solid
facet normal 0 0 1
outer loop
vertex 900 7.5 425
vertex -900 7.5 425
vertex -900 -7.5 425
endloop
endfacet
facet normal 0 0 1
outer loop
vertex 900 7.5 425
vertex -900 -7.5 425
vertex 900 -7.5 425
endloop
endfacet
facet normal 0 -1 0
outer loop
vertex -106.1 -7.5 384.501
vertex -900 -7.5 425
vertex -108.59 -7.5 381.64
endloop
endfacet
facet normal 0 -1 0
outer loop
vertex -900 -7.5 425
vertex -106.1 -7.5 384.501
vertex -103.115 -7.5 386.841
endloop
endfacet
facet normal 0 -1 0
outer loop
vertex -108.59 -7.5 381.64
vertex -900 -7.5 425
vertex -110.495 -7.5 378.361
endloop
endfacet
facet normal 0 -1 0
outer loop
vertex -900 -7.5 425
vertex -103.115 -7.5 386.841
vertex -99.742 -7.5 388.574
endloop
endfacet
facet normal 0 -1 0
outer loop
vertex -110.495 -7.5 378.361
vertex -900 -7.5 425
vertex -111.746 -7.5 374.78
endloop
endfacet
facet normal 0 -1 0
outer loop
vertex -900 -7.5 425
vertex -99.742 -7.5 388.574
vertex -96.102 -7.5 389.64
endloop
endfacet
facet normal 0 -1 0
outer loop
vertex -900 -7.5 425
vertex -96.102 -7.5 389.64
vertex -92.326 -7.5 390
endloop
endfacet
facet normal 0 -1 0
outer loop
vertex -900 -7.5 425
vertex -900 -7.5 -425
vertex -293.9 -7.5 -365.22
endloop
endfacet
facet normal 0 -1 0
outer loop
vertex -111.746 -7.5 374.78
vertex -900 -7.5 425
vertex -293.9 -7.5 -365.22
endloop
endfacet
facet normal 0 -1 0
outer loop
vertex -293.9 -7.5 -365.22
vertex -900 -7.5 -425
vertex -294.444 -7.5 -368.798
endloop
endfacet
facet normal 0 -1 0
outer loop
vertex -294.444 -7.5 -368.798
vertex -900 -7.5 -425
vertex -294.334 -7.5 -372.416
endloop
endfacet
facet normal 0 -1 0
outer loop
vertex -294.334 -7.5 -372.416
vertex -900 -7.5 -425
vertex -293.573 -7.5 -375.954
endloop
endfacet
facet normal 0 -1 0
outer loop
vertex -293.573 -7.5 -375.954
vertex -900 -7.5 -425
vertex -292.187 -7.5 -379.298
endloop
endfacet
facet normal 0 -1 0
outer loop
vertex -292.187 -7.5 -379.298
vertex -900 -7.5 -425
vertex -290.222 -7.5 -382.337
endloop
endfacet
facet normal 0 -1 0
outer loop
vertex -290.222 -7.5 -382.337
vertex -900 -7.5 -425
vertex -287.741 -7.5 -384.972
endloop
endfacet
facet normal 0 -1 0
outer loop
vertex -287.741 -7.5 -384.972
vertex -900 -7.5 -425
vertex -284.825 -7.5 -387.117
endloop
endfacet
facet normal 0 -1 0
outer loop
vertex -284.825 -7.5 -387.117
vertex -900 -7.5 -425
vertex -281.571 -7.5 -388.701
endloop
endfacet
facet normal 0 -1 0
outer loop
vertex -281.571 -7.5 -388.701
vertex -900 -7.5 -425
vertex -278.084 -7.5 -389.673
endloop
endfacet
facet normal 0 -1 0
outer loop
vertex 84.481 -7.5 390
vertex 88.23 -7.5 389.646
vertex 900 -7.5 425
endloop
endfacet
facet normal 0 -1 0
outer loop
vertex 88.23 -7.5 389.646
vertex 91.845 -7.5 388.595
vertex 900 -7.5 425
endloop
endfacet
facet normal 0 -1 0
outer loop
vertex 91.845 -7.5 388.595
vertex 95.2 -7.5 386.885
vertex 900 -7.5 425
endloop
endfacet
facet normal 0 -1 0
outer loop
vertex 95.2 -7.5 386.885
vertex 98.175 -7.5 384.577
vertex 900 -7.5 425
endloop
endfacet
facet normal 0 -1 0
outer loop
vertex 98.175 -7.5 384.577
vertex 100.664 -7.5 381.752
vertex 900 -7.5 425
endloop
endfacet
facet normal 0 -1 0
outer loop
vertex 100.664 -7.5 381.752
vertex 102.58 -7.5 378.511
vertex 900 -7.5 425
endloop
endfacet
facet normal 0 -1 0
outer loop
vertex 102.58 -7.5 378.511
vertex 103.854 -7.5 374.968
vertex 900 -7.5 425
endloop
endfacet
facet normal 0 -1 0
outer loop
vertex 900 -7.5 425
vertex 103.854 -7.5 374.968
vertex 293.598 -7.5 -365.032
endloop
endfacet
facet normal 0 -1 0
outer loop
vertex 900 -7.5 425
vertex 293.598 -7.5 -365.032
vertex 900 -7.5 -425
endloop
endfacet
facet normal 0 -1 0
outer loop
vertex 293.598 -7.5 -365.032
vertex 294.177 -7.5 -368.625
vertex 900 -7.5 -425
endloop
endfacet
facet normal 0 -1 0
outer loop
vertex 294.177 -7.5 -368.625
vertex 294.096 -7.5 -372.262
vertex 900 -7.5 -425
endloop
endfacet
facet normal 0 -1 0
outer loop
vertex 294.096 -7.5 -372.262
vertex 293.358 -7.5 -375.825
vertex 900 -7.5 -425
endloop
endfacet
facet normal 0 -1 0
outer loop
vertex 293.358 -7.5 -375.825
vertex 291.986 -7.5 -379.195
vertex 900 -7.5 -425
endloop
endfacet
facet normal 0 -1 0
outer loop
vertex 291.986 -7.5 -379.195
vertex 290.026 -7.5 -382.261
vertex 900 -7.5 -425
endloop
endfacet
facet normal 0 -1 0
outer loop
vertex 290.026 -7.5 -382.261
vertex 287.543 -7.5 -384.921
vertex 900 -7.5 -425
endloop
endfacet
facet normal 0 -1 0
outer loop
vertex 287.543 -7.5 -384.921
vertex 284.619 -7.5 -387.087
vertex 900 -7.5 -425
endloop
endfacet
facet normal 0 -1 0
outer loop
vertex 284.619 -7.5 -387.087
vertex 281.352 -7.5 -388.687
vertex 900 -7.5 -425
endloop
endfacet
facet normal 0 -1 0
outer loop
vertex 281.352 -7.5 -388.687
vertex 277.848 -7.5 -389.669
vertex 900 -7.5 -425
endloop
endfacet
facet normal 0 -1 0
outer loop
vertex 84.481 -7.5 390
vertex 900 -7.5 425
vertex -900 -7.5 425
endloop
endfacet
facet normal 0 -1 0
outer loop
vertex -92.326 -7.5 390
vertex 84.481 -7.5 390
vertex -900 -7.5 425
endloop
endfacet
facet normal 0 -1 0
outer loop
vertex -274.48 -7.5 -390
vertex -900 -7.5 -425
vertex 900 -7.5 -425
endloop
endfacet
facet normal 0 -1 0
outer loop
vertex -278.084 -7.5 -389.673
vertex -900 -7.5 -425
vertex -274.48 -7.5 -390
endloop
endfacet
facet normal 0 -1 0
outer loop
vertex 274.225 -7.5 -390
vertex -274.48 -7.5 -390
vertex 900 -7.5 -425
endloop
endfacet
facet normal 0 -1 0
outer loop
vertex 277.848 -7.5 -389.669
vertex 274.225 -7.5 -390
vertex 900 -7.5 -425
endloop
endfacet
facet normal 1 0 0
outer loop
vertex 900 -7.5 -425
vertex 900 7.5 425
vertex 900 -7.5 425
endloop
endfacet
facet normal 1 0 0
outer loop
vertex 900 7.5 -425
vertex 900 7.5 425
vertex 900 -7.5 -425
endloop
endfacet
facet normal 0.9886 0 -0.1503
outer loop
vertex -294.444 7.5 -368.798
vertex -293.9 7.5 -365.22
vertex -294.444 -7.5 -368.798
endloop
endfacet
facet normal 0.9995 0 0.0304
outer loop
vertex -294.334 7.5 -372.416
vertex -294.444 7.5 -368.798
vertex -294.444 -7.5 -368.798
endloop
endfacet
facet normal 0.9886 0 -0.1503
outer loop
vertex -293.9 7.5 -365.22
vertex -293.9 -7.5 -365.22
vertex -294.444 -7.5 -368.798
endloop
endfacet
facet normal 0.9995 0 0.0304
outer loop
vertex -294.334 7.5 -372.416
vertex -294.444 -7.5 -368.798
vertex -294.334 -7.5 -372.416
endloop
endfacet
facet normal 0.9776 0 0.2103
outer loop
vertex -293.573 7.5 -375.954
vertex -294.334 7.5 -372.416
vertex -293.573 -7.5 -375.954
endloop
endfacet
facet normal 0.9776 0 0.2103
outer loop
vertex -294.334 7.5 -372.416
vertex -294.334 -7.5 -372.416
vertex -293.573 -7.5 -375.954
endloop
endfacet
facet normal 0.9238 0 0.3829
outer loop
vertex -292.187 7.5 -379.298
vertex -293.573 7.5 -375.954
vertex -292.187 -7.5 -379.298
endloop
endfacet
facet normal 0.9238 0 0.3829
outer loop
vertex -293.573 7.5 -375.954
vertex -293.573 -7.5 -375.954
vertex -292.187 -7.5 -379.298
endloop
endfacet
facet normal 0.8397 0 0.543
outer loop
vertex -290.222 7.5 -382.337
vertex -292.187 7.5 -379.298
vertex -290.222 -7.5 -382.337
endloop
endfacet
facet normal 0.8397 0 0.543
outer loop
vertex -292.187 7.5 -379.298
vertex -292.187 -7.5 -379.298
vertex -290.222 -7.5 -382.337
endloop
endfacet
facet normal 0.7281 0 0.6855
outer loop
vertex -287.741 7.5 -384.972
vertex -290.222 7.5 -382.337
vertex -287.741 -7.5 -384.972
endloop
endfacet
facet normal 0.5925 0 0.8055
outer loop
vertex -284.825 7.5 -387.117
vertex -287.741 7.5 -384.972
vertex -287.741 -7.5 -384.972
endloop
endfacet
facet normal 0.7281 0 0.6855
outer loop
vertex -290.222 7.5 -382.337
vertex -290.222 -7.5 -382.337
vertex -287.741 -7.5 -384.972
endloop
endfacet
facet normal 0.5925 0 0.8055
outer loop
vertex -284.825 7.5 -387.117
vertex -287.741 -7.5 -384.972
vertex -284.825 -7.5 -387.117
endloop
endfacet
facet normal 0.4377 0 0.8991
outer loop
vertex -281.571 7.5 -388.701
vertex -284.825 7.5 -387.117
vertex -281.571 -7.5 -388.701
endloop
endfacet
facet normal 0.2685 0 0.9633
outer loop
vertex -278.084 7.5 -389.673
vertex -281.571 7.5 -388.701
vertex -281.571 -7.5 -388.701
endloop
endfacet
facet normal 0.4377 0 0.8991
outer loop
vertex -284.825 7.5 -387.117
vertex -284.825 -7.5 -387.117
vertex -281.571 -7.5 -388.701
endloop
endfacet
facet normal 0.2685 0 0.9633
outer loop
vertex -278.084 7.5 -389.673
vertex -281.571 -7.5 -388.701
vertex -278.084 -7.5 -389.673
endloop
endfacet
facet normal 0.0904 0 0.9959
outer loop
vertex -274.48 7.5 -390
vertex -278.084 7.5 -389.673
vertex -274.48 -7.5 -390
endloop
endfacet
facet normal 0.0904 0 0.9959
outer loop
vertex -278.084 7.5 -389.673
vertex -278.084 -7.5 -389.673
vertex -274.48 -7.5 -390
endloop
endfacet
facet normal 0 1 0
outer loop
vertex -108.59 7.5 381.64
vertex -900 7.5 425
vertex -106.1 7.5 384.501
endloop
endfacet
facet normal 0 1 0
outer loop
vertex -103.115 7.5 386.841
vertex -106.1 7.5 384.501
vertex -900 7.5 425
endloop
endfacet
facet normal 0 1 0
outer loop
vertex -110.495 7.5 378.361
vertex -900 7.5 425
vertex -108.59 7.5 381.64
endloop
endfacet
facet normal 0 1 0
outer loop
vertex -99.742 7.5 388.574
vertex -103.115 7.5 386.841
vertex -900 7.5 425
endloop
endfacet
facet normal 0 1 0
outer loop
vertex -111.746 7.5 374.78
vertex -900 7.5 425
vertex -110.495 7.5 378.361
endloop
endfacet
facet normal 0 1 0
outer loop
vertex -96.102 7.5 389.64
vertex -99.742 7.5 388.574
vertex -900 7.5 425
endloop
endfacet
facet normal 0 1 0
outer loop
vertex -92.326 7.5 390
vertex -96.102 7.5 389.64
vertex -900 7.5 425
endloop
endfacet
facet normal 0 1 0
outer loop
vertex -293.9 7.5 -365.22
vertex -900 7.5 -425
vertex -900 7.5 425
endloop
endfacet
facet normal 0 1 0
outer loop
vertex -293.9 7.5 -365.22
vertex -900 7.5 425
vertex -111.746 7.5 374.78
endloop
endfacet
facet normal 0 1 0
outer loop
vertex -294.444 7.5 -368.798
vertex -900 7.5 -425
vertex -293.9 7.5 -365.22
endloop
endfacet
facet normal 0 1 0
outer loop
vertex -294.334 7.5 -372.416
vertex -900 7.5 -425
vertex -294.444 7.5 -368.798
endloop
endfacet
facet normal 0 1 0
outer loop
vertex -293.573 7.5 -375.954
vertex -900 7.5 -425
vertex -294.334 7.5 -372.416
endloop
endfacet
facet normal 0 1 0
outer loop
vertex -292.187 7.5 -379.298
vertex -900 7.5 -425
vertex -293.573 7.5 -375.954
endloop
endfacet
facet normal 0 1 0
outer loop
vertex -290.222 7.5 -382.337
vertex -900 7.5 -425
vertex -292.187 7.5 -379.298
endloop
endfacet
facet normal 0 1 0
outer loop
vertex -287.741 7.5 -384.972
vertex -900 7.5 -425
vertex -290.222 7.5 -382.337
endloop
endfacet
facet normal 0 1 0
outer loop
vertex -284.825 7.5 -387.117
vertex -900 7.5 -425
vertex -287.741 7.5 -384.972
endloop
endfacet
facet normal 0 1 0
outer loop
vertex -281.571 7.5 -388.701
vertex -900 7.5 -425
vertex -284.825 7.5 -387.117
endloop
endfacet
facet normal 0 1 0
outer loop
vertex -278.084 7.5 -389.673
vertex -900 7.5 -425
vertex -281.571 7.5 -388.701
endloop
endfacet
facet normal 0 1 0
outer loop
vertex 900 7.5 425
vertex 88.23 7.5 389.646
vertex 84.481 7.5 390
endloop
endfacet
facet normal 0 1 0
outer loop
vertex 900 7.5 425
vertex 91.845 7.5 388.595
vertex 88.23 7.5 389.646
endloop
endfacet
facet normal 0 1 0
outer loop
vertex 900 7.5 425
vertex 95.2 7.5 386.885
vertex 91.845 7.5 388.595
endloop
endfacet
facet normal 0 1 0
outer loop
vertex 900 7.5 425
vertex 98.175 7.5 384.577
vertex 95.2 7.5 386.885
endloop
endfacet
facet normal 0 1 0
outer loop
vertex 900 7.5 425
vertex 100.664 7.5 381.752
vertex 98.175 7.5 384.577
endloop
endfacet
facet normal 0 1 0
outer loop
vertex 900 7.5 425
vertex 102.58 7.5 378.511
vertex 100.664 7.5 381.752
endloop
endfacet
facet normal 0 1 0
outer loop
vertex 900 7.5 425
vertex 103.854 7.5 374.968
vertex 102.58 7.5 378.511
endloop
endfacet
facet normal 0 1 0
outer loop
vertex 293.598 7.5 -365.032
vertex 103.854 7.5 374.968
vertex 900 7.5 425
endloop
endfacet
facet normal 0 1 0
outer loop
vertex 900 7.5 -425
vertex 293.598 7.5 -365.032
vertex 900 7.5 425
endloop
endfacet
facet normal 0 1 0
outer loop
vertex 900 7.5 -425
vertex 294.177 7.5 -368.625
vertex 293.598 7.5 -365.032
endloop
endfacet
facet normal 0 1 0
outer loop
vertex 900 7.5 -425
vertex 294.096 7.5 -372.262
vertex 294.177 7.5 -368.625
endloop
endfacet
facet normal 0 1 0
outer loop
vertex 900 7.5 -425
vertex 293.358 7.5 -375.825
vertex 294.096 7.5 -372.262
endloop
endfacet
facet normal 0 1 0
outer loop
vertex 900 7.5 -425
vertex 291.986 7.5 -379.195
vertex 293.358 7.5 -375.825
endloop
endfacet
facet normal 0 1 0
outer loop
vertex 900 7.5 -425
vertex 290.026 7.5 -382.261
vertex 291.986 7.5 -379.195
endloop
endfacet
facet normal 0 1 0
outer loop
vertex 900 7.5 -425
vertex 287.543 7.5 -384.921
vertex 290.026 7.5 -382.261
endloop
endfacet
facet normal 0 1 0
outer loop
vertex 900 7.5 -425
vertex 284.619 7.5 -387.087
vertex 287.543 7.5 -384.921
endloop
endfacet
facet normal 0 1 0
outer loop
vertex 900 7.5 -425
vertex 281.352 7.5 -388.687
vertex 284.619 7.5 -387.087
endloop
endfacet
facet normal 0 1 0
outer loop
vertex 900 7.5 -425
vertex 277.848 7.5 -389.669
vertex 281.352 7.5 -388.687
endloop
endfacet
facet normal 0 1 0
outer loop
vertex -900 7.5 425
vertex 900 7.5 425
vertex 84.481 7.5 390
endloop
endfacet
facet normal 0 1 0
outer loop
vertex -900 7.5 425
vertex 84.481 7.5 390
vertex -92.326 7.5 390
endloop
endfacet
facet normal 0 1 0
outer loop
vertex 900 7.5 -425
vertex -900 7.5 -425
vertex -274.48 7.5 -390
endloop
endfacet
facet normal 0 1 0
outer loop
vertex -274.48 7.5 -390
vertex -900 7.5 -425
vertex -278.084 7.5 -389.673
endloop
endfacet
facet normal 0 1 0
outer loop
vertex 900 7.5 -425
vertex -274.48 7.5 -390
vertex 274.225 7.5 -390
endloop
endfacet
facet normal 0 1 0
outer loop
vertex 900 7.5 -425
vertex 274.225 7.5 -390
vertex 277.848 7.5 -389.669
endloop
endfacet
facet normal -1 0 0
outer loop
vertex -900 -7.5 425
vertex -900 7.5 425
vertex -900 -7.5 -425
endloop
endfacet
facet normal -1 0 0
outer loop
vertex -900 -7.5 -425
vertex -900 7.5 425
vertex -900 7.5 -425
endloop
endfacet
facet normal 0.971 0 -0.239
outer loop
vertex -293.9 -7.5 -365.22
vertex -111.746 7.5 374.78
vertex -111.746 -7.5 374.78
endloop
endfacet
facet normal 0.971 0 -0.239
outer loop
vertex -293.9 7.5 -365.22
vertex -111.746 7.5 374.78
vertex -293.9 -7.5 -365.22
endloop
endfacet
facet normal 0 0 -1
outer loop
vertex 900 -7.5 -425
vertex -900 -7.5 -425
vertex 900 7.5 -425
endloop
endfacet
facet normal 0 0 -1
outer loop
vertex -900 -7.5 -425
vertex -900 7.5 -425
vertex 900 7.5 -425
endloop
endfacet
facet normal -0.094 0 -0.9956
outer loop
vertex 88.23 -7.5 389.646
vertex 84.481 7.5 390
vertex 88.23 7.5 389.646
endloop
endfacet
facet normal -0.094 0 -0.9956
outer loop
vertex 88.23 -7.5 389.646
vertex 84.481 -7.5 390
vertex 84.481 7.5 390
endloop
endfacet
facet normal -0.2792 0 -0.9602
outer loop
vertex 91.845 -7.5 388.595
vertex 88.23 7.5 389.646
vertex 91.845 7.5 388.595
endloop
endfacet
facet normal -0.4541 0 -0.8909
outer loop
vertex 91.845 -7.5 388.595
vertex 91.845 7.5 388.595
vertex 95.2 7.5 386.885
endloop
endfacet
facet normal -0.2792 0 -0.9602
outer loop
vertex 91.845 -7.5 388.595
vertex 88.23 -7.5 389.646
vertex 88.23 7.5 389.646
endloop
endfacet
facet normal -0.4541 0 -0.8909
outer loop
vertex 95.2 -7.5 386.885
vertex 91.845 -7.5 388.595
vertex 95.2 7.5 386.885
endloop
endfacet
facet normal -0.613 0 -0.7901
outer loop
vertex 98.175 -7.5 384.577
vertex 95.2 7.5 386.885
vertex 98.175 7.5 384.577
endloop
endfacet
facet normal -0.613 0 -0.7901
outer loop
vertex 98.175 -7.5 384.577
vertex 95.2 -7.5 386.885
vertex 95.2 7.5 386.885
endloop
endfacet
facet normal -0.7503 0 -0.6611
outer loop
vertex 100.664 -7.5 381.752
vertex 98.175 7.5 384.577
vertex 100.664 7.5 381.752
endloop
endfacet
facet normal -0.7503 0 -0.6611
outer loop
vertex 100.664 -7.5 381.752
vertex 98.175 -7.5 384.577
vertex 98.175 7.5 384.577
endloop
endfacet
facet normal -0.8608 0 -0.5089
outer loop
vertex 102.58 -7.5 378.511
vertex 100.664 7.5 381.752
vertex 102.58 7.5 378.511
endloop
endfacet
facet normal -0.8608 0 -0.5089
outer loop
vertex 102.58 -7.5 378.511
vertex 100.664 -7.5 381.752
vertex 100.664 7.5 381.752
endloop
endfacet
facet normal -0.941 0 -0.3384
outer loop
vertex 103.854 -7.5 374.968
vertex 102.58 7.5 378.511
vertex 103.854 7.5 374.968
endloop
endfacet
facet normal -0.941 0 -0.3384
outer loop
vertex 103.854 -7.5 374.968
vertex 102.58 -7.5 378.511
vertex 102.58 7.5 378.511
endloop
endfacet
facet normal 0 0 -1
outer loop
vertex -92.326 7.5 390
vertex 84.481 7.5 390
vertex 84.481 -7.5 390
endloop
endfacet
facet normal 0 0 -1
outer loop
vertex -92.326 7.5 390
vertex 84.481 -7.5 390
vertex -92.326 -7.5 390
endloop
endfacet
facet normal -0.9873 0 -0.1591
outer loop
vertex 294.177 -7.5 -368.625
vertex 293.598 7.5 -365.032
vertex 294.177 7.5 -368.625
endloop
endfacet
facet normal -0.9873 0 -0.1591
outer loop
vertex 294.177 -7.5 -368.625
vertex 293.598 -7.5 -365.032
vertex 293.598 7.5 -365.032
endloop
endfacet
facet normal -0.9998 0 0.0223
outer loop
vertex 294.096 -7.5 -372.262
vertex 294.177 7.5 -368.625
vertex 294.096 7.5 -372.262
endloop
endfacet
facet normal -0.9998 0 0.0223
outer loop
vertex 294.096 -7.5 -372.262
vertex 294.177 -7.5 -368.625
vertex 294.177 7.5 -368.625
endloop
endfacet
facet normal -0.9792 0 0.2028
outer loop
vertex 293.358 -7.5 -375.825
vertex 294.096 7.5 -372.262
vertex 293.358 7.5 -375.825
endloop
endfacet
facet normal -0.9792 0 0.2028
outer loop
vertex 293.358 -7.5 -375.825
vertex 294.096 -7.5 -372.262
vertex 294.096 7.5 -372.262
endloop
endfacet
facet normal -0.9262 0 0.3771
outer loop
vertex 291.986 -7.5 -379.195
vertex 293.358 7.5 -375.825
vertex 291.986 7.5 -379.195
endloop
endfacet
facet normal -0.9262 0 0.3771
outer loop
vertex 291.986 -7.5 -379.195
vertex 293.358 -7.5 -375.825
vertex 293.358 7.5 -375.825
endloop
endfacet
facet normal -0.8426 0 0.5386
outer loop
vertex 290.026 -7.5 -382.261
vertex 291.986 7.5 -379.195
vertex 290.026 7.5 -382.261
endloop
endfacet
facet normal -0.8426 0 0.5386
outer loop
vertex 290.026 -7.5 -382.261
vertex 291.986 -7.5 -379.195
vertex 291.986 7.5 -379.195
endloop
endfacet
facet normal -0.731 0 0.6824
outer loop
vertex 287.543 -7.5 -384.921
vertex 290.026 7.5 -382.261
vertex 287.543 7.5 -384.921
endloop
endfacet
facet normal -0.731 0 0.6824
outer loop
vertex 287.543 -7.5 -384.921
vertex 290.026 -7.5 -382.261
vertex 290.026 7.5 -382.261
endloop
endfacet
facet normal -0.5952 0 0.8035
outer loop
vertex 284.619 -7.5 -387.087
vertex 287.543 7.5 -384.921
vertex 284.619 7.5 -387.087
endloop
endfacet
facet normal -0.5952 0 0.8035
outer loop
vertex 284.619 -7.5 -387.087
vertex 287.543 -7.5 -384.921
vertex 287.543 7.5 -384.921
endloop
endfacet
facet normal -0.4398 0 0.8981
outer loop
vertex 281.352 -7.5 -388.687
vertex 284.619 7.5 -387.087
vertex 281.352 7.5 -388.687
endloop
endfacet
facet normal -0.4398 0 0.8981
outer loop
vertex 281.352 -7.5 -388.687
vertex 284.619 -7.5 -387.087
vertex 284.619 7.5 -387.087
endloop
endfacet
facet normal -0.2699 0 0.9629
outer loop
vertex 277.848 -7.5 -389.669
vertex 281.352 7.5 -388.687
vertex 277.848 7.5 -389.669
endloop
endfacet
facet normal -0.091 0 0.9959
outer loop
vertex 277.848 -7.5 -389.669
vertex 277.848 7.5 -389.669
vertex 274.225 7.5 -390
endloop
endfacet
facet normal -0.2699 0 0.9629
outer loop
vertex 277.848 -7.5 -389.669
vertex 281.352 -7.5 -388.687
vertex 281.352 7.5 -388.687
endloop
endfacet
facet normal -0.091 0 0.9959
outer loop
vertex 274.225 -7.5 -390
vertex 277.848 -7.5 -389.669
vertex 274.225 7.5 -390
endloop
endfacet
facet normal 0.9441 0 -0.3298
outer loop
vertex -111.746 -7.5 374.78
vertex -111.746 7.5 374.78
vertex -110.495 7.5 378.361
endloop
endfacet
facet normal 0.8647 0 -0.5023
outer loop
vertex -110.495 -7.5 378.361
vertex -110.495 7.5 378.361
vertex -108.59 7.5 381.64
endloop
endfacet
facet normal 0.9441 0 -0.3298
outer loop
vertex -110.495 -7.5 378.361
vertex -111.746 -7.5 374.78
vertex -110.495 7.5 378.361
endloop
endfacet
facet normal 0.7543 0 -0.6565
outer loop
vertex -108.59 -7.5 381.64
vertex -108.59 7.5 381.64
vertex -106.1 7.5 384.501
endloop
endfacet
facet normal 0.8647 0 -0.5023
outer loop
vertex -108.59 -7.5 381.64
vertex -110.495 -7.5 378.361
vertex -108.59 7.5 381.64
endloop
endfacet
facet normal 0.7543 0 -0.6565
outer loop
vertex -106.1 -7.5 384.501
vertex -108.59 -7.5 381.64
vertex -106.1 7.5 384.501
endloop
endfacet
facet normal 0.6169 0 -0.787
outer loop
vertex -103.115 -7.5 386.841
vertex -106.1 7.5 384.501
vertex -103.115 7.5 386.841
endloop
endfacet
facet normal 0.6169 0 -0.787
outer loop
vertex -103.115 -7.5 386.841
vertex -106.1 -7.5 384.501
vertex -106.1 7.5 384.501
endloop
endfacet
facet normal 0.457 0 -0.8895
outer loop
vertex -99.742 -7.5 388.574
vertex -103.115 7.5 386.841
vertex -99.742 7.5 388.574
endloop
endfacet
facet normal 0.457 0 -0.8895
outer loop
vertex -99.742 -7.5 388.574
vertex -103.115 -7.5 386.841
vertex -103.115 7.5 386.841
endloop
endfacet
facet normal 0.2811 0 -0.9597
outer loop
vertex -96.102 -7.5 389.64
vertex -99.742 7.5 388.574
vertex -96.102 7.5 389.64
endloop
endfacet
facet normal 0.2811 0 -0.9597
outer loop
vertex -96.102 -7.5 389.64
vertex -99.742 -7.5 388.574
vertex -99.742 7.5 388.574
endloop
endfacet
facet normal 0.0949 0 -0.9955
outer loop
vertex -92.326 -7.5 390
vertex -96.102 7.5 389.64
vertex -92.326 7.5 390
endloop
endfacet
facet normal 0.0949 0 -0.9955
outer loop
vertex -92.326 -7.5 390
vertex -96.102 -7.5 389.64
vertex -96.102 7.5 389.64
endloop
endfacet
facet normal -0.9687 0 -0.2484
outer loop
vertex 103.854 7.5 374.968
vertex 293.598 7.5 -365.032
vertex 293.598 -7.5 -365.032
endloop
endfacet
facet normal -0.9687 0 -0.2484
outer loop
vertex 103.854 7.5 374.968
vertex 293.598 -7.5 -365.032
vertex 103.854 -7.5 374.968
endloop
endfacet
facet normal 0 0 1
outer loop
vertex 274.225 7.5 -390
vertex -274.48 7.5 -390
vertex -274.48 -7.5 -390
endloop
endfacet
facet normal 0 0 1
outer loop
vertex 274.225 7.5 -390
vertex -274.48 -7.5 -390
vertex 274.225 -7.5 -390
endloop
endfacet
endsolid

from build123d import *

# Parameters (mm, degrees)
SKETCH1_W           = 1800
SKETCH1_H           = 850
BOSS_EXTRUDE1_DEPTH = 7.5
CUT_EXTRUDE1_DEPTH  = 480
FILLET1_R           = 20


with BuildPart() as part:
    # Sketch1 → Boss-Extrude1 (new, symmetric)
    with BuildSketch(Plane(origin=(0, 0, 0), x_dir=(1, 0, 0), z_dir=(0, 1, 0))):
        Rectangle(SKETCH1_W, SKETCH1_H)
    extrude(amount=BOSS_EXTRUDE1_DEPTH, both=True)

    # Sketch2 → Cut-Extrude1 (cut)
    with BuildSketch(Plane(origin=(0, 7.5, 0), x_dir=(1, 0, 0), z_dir=(0, 1, 0))):
        Polygon((-300, 390), (300, 390), (100, -390), (-108, -390), align=None)
    extrude(amount=-CUT_EXTRUDE1_DEPTH, mode=Mode.SUBTRACT)

    # Fillet1
    fillet1_edges = [part.edges().sort_by_distance(p)[0] for p in [
        (-108, 0, 390),
        (-300, 0, -390),
        (300, 0, -390),
        (100, 0, 390),
    ]]
    fillet(fillet1_edges, radius=FILLET1_R)


solid = part.part
